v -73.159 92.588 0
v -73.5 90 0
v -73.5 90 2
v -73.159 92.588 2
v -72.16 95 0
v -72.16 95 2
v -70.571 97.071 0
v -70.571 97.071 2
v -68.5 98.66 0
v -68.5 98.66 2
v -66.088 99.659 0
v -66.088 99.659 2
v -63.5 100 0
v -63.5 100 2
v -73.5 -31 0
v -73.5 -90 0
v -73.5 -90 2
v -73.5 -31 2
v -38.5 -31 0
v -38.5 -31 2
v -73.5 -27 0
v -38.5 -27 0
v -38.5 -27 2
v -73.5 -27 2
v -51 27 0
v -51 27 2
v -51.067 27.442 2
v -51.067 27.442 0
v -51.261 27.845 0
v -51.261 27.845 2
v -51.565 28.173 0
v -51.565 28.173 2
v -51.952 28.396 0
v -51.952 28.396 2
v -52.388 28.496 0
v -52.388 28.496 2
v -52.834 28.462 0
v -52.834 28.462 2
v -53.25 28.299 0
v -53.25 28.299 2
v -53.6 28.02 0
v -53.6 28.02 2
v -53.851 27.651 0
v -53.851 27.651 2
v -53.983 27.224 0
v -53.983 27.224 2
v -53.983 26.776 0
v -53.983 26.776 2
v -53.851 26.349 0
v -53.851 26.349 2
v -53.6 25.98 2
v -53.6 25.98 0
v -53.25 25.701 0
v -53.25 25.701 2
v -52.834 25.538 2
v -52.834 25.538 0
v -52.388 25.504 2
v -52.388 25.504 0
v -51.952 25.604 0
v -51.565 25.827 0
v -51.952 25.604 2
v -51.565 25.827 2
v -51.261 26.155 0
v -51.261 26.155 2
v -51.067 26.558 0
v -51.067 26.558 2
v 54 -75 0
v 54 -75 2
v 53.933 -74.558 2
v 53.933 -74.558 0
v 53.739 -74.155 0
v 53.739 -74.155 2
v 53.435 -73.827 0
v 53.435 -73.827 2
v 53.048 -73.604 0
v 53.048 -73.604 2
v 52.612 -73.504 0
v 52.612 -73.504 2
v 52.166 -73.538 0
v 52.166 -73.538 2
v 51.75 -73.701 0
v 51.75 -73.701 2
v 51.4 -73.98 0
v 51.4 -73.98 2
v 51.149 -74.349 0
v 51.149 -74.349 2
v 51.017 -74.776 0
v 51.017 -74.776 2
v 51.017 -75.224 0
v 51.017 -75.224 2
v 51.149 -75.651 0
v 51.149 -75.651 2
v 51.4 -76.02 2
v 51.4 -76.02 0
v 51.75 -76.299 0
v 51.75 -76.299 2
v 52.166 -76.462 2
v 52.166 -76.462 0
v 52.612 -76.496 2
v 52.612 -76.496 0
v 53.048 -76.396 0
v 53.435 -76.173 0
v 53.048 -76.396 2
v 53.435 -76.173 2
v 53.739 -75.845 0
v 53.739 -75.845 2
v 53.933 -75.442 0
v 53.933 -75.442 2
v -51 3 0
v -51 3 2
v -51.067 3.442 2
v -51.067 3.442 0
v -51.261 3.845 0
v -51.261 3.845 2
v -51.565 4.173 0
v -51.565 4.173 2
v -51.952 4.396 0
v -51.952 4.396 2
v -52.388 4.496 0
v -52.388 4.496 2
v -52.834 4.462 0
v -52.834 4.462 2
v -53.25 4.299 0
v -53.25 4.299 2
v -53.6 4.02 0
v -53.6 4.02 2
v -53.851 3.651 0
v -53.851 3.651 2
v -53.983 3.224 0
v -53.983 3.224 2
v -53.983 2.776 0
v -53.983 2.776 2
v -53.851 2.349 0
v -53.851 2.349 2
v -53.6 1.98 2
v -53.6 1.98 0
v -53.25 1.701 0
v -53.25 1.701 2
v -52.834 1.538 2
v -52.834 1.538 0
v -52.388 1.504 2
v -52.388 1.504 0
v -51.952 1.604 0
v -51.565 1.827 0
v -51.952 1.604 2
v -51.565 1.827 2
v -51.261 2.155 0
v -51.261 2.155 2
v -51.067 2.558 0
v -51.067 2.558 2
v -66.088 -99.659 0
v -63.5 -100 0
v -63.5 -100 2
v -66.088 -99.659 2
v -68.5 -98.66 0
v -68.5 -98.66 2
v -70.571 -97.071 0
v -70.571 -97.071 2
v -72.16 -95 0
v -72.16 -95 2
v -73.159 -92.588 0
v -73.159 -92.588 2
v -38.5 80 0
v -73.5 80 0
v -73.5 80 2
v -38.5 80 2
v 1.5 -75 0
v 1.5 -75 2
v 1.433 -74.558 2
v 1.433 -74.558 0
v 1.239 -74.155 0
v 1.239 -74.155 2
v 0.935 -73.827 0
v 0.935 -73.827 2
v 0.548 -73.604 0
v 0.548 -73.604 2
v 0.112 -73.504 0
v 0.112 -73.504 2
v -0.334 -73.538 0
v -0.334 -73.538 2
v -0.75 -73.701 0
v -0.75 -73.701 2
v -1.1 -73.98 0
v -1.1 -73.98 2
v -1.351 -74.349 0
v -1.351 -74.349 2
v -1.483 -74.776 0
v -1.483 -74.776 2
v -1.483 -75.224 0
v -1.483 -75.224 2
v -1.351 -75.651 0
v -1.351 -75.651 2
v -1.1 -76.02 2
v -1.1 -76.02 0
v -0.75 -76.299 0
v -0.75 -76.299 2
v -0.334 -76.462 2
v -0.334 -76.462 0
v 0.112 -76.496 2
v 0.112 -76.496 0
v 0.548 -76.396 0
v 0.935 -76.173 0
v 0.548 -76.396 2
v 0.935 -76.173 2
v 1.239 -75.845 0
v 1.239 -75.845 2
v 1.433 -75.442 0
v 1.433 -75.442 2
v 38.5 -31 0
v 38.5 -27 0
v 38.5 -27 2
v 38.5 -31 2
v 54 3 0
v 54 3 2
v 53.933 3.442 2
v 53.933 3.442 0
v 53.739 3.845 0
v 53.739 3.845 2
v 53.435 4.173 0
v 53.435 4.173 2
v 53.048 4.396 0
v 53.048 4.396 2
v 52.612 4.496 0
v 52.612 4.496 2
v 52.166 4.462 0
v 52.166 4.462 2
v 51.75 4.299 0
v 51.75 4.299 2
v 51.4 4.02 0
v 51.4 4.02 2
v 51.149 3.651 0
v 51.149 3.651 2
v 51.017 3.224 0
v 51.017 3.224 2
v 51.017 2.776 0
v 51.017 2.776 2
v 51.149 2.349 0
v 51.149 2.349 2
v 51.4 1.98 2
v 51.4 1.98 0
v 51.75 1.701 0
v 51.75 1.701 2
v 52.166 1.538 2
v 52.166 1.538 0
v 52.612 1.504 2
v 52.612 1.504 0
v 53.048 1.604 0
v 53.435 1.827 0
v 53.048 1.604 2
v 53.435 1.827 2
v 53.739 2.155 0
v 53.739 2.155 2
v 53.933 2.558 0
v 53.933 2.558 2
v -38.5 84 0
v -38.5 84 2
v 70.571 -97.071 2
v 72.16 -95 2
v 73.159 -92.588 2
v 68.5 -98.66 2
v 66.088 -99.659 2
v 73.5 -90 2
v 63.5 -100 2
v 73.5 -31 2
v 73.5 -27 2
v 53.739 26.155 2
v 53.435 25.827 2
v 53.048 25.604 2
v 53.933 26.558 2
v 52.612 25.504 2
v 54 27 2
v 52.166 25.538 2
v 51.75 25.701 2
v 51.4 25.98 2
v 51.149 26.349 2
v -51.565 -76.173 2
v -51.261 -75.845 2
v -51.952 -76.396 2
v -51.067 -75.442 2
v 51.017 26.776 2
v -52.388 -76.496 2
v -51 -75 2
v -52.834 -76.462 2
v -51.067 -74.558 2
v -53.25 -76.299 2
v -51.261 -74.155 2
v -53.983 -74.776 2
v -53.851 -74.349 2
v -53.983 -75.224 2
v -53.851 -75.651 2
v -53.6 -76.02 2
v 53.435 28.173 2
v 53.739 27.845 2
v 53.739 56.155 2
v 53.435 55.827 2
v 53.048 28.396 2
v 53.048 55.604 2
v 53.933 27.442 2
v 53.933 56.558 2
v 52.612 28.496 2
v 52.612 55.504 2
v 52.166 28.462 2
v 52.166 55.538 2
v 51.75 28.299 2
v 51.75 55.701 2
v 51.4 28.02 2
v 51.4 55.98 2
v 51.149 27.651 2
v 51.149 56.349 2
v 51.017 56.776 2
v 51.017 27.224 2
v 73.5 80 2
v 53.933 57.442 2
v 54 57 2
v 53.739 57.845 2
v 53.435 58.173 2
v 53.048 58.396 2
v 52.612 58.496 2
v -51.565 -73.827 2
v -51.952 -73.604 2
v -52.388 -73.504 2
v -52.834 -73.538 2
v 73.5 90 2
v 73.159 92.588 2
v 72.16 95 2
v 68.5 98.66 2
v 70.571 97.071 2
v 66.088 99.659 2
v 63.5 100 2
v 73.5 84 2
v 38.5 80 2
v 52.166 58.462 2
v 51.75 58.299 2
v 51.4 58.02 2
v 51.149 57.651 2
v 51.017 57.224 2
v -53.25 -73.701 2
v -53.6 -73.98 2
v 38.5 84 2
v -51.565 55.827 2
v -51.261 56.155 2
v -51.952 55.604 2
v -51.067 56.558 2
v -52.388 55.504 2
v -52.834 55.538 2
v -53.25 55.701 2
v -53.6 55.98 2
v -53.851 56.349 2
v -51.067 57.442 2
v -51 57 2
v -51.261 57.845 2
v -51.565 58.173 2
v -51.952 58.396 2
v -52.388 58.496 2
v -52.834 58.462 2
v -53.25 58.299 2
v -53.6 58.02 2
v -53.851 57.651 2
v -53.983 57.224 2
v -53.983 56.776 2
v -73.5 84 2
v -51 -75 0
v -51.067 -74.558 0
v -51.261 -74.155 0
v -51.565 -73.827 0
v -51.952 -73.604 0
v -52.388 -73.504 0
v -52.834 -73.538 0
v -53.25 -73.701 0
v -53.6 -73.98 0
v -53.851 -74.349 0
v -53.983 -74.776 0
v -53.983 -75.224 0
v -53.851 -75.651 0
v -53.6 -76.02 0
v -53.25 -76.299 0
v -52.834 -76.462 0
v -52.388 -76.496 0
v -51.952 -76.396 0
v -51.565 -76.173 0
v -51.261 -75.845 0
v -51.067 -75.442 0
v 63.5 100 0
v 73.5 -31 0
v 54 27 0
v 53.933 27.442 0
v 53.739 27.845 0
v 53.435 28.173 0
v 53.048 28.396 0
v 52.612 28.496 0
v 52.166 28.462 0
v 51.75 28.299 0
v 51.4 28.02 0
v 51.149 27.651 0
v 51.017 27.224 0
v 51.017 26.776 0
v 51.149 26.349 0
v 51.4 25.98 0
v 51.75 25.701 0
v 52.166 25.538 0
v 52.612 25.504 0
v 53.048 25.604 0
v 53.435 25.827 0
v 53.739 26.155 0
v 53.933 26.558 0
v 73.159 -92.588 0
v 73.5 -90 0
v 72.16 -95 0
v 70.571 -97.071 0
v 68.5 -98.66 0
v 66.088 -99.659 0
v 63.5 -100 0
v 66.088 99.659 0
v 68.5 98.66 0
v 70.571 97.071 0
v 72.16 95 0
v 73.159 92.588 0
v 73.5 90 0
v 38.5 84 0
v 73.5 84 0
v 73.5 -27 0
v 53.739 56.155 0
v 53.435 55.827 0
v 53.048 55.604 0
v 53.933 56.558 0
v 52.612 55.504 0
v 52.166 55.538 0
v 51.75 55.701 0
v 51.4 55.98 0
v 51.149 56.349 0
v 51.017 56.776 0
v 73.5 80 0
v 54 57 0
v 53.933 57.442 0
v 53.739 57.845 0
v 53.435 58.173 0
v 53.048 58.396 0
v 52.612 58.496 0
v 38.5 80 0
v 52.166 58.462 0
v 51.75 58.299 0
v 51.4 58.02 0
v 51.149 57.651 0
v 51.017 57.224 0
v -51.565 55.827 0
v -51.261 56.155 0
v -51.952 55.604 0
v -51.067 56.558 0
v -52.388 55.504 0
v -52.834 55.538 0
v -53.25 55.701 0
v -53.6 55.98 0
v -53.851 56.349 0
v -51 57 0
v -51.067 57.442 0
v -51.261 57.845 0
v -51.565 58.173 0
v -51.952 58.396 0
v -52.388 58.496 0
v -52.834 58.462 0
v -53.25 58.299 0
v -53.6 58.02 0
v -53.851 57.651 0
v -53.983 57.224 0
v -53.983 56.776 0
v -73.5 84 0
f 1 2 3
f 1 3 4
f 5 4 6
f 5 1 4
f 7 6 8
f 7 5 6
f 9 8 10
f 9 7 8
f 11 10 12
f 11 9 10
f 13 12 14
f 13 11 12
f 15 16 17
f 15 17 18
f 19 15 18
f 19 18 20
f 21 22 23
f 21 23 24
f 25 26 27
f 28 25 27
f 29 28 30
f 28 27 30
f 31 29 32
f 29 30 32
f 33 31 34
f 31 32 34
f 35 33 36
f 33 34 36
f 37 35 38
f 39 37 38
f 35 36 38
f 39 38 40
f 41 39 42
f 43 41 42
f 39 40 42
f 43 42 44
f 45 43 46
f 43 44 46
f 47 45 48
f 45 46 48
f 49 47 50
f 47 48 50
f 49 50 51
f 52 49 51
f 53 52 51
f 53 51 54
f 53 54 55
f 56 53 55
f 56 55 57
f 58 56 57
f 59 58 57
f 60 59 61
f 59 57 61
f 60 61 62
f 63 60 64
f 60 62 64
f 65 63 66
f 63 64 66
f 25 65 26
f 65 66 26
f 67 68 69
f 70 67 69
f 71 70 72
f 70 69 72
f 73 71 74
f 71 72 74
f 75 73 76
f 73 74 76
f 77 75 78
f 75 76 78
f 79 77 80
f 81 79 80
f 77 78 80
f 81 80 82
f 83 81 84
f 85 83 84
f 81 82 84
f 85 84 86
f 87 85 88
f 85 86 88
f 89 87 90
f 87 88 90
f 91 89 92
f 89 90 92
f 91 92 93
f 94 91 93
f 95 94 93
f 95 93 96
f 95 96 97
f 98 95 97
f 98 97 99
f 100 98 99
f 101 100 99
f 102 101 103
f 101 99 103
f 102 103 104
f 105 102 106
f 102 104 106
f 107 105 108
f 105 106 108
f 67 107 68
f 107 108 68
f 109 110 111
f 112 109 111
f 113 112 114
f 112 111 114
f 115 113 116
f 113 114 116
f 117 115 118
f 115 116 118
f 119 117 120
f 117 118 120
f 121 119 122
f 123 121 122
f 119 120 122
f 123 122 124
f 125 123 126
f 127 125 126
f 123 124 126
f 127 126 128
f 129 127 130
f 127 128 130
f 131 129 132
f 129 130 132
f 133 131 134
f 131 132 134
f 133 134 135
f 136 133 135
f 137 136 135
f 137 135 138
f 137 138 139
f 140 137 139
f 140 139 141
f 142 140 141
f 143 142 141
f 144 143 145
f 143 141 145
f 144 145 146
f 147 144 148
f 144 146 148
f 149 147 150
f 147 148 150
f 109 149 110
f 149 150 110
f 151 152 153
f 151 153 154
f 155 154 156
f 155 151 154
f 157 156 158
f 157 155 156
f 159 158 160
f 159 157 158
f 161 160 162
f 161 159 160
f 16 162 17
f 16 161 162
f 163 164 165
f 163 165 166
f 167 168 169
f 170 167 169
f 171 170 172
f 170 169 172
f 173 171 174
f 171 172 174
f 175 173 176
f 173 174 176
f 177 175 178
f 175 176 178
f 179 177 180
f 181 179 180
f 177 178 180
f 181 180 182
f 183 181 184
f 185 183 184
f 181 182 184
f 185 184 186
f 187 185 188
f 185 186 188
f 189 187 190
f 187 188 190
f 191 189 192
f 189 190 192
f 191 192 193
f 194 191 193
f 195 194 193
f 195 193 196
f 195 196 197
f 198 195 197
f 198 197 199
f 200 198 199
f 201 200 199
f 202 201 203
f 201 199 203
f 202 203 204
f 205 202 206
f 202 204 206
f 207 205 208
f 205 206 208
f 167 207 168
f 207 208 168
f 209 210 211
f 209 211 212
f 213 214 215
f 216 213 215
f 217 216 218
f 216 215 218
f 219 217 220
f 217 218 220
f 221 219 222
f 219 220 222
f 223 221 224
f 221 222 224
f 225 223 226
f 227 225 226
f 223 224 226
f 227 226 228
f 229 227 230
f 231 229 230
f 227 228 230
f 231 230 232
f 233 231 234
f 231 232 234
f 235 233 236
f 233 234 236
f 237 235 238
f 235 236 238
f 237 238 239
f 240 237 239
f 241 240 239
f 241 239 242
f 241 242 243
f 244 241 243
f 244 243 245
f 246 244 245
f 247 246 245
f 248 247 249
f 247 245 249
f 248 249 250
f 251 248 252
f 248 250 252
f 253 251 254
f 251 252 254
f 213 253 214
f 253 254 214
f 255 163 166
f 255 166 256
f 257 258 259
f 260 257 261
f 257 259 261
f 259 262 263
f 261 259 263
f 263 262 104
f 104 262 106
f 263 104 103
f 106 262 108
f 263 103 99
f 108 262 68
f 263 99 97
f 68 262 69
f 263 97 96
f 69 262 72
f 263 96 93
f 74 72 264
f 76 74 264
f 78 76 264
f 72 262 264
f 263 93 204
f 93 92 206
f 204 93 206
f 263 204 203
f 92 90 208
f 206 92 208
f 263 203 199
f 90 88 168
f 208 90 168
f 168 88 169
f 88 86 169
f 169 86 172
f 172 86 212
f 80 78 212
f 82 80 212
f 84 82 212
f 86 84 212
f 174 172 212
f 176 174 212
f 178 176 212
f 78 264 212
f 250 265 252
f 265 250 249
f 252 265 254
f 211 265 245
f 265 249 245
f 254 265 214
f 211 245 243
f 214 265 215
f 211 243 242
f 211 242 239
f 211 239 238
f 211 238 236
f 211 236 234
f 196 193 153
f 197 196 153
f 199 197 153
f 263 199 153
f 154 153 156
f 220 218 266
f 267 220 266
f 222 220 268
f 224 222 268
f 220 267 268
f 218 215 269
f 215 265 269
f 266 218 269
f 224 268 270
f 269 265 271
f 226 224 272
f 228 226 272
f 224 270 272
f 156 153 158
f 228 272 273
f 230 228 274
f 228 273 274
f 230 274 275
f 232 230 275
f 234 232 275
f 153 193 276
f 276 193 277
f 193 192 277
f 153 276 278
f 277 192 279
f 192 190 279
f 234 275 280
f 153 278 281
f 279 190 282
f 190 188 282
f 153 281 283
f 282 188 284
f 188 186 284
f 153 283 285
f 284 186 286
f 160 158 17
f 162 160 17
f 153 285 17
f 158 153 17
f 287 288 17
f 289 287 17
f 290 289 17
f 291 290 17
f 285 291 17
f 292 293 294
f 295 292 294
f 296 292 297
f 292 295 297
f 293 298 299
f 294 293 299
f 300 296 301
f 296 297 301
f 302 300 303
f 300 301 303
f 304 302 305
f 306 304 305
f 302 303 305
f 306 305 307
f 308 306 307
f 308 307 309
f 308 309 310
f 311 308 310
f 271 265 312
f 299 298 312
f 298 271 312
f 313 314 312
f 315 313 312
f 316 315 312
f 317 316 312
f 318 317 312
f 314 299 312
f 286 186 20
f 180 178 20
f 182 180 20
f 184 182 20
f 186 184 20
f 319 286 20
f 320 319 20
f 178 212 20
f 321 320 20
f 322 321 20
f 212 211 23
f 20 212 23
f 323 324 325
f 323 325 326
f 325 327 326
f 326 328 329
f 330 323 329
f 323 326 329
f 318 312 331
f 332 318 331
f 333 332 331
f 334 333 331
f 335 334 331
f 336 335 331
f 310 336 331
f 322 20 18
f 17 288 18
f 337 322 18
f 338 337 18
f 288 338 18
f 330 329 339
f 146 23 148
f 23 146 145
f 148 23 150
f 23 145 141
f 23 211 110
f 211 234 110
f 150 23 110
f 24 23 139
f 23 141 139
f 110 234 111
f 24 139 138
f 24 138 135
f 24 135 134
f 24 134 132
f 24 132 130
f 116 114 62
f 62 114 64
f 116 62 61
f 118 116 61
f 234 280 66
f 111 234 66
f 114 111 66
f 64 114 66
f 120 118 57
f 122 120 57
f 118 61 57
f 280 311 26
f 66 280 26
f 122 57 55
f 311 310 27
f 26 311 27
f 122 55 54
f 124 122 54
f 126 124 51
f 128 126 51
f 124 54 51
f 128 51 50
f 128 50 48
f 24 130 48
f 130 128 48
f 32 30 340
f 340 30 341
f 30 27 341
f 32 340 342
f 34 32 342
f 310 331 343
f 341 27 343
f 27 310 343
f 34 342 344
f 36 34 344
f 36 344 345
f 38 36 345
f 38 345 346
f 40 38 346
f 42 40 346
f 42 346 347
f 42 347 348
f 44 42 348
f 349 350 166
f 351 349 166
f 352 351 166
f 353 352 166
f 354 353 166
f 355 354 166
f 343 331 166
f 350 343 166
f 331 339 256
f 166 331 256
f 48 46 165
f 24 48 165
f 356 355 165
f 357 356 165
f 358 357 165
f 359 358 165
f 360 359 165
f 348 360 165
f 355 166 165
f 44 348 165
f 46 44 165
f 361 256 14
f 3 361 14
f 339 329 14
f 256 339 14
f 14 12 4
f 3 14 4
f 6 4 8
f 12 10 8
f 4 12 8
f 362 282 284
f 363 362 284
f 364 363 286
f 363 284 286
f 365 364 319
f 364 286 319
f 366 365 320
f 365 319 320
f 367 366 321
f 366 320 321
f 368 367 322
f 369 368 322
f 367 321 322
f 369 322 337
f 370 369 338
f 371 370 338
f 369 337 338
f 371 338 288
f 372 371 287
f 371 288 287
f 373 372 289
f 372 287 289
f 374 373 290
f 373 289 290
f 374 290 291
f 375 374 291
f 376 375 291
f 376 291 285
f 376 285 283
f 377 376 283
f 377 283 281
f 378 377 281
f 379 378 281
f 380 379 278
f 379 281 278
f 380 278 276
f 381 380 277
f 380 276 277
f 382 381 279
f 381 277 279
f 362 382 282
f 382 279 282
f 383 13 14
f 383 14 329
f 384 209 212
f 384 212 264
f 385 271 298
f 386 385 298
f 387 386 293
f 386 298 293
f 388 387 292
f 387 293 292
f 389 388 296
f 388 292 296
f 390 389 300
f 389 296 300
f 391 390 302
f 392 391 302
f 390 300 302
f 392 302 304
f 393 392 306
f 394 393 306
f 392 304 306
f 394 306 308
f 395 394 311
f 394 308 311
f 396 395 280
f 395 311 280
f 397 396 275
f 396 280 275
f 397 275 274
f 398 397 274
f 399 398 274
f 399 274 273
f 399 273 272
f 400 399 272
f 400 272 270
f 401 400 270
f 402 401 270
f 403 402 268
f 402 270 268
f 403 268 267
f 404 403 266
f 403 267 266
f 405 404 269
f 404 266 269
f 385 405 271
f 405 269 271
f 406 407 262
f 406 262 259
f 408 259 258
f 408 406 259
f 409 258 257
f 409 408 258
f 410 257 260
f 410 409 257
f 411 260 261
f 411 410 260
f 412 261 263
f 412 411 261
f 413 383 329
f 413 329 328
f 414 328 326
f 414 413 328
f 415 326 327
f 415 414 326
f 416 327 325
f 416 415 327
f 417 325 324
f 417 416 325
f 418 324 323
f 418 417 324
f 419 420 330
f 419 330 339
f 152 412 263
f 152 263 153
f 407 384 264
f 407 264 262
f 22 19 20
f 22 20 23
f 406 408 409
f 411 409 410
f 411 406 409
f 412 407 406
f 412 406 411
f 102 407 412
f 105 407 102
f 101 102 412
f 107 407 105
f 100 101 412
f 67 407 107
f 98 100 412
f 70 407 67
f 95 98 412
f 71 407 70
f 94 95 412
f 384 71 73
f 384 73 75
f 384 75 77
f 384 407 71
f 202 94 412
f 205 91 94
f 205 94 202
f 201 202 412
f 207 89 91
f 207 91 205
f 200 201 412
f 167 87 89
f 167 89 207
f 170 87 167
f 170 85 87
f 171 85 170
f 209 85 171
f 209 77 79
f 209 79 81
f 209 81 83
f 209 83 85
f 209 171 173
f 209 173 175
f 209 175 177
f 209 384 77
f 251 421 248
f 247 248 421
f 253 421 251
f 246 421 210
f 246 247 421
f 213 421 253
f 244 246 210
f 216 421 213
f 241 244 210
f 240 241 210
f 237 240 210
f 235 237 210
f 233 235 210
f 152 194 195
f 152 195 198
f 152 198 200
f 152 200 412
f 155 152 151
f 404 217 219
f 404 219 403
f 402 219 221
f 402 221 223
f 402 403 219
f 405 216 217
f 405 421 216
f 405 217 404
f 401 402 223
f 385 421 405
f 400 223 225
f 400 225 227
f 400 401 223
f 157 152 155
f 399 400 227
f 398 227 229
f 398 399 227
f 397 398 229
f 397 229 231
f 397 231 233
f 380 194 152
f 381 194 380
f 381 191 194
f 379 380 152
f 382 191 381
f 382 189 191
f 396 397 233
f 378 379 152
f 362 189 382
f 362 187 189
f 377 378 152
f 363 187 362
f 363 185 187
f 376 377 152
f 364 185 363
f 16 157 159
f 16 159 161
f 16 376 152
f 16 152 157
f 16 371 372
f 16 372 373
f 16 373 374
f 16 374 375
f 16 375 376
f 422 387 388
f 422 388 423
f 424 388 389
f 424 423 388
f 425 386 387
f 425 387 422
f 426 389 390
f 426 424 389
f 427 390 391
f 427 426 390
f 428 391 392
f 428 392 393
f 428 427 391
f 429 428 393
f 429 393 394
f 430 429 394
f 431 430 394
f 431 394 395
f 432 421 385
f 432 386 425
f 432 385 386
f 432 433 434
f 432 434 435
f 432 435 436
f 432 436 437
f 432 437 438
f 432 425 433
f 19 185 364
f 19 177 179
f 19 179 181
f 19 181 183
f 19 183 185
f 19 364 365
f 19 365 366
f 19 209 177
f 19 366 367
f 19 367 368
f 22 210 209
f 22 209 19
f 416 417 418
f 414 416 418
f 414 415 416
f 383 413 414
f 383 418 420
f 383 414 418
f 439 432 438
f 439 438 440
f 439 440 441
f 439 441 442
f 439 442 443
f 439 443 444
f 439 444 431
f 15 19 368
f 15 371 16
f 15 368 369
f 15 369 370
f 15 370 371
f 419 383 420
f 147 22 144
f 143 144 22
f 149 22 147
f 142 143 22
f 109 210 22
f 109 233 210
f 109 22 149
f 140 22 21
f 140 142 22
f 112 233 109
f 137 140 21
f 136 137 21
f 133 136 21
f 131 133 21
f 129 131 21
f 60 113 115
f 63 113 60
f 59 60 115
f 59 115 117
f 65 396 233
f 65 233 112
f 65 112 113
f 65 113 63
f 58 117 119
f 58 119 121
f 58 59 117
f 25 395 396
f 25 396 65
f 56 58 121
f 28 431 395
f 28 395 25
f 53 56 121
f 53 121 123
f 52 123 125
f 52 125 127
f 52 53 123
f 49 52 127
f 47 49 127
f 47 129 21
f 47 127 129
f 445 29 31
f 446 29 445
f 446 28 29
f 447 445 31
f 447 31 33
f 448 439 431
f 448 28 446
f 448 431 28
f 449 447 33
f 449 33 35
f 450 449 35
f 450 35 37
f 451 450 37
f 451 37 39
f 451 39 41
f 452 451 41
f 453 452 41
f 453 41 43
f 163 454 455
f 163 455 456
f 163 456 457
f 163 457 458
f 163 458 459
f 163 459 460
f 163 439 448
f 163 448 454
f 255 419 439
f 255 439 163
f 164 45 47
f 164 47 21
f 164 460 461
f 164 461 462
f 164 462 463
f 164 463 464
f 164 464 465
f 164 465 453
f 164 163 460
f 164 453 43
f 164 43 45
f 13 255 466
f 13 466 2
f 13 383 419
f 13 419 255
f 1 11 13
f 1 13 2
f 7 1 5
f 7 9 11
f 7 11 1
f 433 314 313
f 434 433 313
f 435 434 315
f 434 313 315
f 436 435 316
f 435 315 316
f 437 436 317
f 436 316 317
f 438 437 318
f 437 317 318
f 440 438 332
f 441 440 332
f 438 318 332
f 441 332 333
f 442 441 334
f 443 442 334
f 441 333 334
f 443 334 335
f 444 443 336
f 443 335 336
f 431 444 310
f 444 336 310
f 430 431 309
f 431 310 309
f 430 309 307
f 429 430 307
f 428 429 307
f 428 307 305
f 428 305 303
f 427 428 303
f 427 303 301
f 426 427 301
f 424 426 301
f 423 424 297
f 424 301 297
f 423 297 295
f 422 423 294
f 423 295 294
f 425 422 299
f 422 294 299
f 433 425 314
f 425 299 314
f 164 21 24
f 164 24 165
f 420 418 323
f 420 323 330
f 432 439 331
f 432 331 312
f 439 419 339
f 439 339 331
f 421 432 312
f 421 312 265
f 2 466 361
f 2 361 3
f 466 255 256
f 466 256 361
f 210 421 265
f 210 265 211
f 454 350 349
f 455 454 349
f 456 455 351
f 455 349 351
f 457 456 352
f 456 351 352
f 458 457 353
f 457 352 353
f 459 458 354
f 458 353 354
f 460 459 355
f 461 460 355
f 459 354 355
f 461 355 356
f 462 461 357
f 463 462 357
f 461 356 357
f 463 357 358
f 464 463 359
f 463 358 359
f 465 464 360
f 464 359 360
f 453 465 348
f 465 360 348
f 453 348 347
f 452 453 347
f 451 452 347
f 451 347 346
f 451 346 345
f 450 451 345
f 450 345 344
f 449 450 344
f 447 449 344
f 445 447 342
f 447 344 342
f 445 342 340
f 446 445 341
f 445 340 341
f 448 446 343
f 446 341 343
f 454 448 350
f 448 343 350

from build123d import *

# Parameters (mm, degrees)
RESSALTO_EXTRUS_O1_DEPTH = 2
ESBO_O2_R                = 1.5
CORTE_EXTRUS_O1_DEPTH    = 2


with BuildPart() as part:
    # Esboço1 → Ressalto-extrusão1 (new body)
    with BuildSketch(Plane.XY):
        with BuildLine():
            Line((-73.5, -27), (-73.5, 80))
            Line((-73.5, 80), (-38.5, 80))
            Line((-38.5, 80), (-38.5, 84))
            Line((-38.5, 84), (-73.5, 84))
            Line((-73.5, 84), (-73.5, 90))
            ThreePointArc((-73.5, 90), (-70.571067812, 97.071067812), (-63.5, 100))
            Line((-63.5, 100), (63.5, 100))
            ThreePointArc((63.5, 100), (70.571067812, 97.071067812), (73.5, 90))
            Line((73.5, 90), (73.5, 84))
            Line((73.5, 84), (38.5, 84))
            Line((38.5, 84), (38.5, 80))
            Line((38.5, 80), (73.5, 80))
            Line((73.5, 80), (73.5, -27))
            Line((73.5, -27), (38.5, -27))
            Line((38.5, -27), (38.5, -31))
            Line((38.5, -31), (73.5, -31))
            Line((73.5, -31), (73.5, -90))
            ThreePointArc((73.5, -90), (70.571067812, -97.071067812), (63.5, -100))
            Line((63.5, -100), (-63.5, -100))
            ThreePointArc((-63.5, -100), (-70.571067812, -97.071067812), (-73.5, -90))
            Line((-73.5, -90), (-73.5, -31))
            Line((-73.5, -31), (-38.5, -31))
            Line((-38.5, -31), (-38.5, -27))
            Line((-38.5, -27), (-73.5, -27))
        make_face()
    extrude(amount=RESSALTO_EXTRUS_O1_DEPTH)

    # Esboço2 → Corte-extrusão1 (cut)
    with BuildSketch(Plane.XY.offset(2)):
        with Locations((-52.5, 57)):
            Circle(ESBO_O2_R)
        with Locations((-52.5, 27)):
            Circle(ESBO_O2_R)
        with Locations((-52.5, 3)):
            Circle(ESBO_O2_R)
        with Locations((-52.5, -75)):
            Circle(ESBO_O2_R)
        with Locations((52.5, 57)):
            Circle(ESBO_O2_R)
        with Locations((52.5, -75)):
            Circle(ESBO_O2_R)
        with Locations((52.5, 3)):
            Circle(ESBO_O2_R)
        with Locations((52.5, 27)):
            Circle(ESBO_O2_R)
        with Locations((0, -75)):
            Circle(ESBO_O2_R)
    extrude(amount=-CORTE_EXTRUS_O1_DEPTH, mode=Mode.SUBTRACT)


solid = part.part
